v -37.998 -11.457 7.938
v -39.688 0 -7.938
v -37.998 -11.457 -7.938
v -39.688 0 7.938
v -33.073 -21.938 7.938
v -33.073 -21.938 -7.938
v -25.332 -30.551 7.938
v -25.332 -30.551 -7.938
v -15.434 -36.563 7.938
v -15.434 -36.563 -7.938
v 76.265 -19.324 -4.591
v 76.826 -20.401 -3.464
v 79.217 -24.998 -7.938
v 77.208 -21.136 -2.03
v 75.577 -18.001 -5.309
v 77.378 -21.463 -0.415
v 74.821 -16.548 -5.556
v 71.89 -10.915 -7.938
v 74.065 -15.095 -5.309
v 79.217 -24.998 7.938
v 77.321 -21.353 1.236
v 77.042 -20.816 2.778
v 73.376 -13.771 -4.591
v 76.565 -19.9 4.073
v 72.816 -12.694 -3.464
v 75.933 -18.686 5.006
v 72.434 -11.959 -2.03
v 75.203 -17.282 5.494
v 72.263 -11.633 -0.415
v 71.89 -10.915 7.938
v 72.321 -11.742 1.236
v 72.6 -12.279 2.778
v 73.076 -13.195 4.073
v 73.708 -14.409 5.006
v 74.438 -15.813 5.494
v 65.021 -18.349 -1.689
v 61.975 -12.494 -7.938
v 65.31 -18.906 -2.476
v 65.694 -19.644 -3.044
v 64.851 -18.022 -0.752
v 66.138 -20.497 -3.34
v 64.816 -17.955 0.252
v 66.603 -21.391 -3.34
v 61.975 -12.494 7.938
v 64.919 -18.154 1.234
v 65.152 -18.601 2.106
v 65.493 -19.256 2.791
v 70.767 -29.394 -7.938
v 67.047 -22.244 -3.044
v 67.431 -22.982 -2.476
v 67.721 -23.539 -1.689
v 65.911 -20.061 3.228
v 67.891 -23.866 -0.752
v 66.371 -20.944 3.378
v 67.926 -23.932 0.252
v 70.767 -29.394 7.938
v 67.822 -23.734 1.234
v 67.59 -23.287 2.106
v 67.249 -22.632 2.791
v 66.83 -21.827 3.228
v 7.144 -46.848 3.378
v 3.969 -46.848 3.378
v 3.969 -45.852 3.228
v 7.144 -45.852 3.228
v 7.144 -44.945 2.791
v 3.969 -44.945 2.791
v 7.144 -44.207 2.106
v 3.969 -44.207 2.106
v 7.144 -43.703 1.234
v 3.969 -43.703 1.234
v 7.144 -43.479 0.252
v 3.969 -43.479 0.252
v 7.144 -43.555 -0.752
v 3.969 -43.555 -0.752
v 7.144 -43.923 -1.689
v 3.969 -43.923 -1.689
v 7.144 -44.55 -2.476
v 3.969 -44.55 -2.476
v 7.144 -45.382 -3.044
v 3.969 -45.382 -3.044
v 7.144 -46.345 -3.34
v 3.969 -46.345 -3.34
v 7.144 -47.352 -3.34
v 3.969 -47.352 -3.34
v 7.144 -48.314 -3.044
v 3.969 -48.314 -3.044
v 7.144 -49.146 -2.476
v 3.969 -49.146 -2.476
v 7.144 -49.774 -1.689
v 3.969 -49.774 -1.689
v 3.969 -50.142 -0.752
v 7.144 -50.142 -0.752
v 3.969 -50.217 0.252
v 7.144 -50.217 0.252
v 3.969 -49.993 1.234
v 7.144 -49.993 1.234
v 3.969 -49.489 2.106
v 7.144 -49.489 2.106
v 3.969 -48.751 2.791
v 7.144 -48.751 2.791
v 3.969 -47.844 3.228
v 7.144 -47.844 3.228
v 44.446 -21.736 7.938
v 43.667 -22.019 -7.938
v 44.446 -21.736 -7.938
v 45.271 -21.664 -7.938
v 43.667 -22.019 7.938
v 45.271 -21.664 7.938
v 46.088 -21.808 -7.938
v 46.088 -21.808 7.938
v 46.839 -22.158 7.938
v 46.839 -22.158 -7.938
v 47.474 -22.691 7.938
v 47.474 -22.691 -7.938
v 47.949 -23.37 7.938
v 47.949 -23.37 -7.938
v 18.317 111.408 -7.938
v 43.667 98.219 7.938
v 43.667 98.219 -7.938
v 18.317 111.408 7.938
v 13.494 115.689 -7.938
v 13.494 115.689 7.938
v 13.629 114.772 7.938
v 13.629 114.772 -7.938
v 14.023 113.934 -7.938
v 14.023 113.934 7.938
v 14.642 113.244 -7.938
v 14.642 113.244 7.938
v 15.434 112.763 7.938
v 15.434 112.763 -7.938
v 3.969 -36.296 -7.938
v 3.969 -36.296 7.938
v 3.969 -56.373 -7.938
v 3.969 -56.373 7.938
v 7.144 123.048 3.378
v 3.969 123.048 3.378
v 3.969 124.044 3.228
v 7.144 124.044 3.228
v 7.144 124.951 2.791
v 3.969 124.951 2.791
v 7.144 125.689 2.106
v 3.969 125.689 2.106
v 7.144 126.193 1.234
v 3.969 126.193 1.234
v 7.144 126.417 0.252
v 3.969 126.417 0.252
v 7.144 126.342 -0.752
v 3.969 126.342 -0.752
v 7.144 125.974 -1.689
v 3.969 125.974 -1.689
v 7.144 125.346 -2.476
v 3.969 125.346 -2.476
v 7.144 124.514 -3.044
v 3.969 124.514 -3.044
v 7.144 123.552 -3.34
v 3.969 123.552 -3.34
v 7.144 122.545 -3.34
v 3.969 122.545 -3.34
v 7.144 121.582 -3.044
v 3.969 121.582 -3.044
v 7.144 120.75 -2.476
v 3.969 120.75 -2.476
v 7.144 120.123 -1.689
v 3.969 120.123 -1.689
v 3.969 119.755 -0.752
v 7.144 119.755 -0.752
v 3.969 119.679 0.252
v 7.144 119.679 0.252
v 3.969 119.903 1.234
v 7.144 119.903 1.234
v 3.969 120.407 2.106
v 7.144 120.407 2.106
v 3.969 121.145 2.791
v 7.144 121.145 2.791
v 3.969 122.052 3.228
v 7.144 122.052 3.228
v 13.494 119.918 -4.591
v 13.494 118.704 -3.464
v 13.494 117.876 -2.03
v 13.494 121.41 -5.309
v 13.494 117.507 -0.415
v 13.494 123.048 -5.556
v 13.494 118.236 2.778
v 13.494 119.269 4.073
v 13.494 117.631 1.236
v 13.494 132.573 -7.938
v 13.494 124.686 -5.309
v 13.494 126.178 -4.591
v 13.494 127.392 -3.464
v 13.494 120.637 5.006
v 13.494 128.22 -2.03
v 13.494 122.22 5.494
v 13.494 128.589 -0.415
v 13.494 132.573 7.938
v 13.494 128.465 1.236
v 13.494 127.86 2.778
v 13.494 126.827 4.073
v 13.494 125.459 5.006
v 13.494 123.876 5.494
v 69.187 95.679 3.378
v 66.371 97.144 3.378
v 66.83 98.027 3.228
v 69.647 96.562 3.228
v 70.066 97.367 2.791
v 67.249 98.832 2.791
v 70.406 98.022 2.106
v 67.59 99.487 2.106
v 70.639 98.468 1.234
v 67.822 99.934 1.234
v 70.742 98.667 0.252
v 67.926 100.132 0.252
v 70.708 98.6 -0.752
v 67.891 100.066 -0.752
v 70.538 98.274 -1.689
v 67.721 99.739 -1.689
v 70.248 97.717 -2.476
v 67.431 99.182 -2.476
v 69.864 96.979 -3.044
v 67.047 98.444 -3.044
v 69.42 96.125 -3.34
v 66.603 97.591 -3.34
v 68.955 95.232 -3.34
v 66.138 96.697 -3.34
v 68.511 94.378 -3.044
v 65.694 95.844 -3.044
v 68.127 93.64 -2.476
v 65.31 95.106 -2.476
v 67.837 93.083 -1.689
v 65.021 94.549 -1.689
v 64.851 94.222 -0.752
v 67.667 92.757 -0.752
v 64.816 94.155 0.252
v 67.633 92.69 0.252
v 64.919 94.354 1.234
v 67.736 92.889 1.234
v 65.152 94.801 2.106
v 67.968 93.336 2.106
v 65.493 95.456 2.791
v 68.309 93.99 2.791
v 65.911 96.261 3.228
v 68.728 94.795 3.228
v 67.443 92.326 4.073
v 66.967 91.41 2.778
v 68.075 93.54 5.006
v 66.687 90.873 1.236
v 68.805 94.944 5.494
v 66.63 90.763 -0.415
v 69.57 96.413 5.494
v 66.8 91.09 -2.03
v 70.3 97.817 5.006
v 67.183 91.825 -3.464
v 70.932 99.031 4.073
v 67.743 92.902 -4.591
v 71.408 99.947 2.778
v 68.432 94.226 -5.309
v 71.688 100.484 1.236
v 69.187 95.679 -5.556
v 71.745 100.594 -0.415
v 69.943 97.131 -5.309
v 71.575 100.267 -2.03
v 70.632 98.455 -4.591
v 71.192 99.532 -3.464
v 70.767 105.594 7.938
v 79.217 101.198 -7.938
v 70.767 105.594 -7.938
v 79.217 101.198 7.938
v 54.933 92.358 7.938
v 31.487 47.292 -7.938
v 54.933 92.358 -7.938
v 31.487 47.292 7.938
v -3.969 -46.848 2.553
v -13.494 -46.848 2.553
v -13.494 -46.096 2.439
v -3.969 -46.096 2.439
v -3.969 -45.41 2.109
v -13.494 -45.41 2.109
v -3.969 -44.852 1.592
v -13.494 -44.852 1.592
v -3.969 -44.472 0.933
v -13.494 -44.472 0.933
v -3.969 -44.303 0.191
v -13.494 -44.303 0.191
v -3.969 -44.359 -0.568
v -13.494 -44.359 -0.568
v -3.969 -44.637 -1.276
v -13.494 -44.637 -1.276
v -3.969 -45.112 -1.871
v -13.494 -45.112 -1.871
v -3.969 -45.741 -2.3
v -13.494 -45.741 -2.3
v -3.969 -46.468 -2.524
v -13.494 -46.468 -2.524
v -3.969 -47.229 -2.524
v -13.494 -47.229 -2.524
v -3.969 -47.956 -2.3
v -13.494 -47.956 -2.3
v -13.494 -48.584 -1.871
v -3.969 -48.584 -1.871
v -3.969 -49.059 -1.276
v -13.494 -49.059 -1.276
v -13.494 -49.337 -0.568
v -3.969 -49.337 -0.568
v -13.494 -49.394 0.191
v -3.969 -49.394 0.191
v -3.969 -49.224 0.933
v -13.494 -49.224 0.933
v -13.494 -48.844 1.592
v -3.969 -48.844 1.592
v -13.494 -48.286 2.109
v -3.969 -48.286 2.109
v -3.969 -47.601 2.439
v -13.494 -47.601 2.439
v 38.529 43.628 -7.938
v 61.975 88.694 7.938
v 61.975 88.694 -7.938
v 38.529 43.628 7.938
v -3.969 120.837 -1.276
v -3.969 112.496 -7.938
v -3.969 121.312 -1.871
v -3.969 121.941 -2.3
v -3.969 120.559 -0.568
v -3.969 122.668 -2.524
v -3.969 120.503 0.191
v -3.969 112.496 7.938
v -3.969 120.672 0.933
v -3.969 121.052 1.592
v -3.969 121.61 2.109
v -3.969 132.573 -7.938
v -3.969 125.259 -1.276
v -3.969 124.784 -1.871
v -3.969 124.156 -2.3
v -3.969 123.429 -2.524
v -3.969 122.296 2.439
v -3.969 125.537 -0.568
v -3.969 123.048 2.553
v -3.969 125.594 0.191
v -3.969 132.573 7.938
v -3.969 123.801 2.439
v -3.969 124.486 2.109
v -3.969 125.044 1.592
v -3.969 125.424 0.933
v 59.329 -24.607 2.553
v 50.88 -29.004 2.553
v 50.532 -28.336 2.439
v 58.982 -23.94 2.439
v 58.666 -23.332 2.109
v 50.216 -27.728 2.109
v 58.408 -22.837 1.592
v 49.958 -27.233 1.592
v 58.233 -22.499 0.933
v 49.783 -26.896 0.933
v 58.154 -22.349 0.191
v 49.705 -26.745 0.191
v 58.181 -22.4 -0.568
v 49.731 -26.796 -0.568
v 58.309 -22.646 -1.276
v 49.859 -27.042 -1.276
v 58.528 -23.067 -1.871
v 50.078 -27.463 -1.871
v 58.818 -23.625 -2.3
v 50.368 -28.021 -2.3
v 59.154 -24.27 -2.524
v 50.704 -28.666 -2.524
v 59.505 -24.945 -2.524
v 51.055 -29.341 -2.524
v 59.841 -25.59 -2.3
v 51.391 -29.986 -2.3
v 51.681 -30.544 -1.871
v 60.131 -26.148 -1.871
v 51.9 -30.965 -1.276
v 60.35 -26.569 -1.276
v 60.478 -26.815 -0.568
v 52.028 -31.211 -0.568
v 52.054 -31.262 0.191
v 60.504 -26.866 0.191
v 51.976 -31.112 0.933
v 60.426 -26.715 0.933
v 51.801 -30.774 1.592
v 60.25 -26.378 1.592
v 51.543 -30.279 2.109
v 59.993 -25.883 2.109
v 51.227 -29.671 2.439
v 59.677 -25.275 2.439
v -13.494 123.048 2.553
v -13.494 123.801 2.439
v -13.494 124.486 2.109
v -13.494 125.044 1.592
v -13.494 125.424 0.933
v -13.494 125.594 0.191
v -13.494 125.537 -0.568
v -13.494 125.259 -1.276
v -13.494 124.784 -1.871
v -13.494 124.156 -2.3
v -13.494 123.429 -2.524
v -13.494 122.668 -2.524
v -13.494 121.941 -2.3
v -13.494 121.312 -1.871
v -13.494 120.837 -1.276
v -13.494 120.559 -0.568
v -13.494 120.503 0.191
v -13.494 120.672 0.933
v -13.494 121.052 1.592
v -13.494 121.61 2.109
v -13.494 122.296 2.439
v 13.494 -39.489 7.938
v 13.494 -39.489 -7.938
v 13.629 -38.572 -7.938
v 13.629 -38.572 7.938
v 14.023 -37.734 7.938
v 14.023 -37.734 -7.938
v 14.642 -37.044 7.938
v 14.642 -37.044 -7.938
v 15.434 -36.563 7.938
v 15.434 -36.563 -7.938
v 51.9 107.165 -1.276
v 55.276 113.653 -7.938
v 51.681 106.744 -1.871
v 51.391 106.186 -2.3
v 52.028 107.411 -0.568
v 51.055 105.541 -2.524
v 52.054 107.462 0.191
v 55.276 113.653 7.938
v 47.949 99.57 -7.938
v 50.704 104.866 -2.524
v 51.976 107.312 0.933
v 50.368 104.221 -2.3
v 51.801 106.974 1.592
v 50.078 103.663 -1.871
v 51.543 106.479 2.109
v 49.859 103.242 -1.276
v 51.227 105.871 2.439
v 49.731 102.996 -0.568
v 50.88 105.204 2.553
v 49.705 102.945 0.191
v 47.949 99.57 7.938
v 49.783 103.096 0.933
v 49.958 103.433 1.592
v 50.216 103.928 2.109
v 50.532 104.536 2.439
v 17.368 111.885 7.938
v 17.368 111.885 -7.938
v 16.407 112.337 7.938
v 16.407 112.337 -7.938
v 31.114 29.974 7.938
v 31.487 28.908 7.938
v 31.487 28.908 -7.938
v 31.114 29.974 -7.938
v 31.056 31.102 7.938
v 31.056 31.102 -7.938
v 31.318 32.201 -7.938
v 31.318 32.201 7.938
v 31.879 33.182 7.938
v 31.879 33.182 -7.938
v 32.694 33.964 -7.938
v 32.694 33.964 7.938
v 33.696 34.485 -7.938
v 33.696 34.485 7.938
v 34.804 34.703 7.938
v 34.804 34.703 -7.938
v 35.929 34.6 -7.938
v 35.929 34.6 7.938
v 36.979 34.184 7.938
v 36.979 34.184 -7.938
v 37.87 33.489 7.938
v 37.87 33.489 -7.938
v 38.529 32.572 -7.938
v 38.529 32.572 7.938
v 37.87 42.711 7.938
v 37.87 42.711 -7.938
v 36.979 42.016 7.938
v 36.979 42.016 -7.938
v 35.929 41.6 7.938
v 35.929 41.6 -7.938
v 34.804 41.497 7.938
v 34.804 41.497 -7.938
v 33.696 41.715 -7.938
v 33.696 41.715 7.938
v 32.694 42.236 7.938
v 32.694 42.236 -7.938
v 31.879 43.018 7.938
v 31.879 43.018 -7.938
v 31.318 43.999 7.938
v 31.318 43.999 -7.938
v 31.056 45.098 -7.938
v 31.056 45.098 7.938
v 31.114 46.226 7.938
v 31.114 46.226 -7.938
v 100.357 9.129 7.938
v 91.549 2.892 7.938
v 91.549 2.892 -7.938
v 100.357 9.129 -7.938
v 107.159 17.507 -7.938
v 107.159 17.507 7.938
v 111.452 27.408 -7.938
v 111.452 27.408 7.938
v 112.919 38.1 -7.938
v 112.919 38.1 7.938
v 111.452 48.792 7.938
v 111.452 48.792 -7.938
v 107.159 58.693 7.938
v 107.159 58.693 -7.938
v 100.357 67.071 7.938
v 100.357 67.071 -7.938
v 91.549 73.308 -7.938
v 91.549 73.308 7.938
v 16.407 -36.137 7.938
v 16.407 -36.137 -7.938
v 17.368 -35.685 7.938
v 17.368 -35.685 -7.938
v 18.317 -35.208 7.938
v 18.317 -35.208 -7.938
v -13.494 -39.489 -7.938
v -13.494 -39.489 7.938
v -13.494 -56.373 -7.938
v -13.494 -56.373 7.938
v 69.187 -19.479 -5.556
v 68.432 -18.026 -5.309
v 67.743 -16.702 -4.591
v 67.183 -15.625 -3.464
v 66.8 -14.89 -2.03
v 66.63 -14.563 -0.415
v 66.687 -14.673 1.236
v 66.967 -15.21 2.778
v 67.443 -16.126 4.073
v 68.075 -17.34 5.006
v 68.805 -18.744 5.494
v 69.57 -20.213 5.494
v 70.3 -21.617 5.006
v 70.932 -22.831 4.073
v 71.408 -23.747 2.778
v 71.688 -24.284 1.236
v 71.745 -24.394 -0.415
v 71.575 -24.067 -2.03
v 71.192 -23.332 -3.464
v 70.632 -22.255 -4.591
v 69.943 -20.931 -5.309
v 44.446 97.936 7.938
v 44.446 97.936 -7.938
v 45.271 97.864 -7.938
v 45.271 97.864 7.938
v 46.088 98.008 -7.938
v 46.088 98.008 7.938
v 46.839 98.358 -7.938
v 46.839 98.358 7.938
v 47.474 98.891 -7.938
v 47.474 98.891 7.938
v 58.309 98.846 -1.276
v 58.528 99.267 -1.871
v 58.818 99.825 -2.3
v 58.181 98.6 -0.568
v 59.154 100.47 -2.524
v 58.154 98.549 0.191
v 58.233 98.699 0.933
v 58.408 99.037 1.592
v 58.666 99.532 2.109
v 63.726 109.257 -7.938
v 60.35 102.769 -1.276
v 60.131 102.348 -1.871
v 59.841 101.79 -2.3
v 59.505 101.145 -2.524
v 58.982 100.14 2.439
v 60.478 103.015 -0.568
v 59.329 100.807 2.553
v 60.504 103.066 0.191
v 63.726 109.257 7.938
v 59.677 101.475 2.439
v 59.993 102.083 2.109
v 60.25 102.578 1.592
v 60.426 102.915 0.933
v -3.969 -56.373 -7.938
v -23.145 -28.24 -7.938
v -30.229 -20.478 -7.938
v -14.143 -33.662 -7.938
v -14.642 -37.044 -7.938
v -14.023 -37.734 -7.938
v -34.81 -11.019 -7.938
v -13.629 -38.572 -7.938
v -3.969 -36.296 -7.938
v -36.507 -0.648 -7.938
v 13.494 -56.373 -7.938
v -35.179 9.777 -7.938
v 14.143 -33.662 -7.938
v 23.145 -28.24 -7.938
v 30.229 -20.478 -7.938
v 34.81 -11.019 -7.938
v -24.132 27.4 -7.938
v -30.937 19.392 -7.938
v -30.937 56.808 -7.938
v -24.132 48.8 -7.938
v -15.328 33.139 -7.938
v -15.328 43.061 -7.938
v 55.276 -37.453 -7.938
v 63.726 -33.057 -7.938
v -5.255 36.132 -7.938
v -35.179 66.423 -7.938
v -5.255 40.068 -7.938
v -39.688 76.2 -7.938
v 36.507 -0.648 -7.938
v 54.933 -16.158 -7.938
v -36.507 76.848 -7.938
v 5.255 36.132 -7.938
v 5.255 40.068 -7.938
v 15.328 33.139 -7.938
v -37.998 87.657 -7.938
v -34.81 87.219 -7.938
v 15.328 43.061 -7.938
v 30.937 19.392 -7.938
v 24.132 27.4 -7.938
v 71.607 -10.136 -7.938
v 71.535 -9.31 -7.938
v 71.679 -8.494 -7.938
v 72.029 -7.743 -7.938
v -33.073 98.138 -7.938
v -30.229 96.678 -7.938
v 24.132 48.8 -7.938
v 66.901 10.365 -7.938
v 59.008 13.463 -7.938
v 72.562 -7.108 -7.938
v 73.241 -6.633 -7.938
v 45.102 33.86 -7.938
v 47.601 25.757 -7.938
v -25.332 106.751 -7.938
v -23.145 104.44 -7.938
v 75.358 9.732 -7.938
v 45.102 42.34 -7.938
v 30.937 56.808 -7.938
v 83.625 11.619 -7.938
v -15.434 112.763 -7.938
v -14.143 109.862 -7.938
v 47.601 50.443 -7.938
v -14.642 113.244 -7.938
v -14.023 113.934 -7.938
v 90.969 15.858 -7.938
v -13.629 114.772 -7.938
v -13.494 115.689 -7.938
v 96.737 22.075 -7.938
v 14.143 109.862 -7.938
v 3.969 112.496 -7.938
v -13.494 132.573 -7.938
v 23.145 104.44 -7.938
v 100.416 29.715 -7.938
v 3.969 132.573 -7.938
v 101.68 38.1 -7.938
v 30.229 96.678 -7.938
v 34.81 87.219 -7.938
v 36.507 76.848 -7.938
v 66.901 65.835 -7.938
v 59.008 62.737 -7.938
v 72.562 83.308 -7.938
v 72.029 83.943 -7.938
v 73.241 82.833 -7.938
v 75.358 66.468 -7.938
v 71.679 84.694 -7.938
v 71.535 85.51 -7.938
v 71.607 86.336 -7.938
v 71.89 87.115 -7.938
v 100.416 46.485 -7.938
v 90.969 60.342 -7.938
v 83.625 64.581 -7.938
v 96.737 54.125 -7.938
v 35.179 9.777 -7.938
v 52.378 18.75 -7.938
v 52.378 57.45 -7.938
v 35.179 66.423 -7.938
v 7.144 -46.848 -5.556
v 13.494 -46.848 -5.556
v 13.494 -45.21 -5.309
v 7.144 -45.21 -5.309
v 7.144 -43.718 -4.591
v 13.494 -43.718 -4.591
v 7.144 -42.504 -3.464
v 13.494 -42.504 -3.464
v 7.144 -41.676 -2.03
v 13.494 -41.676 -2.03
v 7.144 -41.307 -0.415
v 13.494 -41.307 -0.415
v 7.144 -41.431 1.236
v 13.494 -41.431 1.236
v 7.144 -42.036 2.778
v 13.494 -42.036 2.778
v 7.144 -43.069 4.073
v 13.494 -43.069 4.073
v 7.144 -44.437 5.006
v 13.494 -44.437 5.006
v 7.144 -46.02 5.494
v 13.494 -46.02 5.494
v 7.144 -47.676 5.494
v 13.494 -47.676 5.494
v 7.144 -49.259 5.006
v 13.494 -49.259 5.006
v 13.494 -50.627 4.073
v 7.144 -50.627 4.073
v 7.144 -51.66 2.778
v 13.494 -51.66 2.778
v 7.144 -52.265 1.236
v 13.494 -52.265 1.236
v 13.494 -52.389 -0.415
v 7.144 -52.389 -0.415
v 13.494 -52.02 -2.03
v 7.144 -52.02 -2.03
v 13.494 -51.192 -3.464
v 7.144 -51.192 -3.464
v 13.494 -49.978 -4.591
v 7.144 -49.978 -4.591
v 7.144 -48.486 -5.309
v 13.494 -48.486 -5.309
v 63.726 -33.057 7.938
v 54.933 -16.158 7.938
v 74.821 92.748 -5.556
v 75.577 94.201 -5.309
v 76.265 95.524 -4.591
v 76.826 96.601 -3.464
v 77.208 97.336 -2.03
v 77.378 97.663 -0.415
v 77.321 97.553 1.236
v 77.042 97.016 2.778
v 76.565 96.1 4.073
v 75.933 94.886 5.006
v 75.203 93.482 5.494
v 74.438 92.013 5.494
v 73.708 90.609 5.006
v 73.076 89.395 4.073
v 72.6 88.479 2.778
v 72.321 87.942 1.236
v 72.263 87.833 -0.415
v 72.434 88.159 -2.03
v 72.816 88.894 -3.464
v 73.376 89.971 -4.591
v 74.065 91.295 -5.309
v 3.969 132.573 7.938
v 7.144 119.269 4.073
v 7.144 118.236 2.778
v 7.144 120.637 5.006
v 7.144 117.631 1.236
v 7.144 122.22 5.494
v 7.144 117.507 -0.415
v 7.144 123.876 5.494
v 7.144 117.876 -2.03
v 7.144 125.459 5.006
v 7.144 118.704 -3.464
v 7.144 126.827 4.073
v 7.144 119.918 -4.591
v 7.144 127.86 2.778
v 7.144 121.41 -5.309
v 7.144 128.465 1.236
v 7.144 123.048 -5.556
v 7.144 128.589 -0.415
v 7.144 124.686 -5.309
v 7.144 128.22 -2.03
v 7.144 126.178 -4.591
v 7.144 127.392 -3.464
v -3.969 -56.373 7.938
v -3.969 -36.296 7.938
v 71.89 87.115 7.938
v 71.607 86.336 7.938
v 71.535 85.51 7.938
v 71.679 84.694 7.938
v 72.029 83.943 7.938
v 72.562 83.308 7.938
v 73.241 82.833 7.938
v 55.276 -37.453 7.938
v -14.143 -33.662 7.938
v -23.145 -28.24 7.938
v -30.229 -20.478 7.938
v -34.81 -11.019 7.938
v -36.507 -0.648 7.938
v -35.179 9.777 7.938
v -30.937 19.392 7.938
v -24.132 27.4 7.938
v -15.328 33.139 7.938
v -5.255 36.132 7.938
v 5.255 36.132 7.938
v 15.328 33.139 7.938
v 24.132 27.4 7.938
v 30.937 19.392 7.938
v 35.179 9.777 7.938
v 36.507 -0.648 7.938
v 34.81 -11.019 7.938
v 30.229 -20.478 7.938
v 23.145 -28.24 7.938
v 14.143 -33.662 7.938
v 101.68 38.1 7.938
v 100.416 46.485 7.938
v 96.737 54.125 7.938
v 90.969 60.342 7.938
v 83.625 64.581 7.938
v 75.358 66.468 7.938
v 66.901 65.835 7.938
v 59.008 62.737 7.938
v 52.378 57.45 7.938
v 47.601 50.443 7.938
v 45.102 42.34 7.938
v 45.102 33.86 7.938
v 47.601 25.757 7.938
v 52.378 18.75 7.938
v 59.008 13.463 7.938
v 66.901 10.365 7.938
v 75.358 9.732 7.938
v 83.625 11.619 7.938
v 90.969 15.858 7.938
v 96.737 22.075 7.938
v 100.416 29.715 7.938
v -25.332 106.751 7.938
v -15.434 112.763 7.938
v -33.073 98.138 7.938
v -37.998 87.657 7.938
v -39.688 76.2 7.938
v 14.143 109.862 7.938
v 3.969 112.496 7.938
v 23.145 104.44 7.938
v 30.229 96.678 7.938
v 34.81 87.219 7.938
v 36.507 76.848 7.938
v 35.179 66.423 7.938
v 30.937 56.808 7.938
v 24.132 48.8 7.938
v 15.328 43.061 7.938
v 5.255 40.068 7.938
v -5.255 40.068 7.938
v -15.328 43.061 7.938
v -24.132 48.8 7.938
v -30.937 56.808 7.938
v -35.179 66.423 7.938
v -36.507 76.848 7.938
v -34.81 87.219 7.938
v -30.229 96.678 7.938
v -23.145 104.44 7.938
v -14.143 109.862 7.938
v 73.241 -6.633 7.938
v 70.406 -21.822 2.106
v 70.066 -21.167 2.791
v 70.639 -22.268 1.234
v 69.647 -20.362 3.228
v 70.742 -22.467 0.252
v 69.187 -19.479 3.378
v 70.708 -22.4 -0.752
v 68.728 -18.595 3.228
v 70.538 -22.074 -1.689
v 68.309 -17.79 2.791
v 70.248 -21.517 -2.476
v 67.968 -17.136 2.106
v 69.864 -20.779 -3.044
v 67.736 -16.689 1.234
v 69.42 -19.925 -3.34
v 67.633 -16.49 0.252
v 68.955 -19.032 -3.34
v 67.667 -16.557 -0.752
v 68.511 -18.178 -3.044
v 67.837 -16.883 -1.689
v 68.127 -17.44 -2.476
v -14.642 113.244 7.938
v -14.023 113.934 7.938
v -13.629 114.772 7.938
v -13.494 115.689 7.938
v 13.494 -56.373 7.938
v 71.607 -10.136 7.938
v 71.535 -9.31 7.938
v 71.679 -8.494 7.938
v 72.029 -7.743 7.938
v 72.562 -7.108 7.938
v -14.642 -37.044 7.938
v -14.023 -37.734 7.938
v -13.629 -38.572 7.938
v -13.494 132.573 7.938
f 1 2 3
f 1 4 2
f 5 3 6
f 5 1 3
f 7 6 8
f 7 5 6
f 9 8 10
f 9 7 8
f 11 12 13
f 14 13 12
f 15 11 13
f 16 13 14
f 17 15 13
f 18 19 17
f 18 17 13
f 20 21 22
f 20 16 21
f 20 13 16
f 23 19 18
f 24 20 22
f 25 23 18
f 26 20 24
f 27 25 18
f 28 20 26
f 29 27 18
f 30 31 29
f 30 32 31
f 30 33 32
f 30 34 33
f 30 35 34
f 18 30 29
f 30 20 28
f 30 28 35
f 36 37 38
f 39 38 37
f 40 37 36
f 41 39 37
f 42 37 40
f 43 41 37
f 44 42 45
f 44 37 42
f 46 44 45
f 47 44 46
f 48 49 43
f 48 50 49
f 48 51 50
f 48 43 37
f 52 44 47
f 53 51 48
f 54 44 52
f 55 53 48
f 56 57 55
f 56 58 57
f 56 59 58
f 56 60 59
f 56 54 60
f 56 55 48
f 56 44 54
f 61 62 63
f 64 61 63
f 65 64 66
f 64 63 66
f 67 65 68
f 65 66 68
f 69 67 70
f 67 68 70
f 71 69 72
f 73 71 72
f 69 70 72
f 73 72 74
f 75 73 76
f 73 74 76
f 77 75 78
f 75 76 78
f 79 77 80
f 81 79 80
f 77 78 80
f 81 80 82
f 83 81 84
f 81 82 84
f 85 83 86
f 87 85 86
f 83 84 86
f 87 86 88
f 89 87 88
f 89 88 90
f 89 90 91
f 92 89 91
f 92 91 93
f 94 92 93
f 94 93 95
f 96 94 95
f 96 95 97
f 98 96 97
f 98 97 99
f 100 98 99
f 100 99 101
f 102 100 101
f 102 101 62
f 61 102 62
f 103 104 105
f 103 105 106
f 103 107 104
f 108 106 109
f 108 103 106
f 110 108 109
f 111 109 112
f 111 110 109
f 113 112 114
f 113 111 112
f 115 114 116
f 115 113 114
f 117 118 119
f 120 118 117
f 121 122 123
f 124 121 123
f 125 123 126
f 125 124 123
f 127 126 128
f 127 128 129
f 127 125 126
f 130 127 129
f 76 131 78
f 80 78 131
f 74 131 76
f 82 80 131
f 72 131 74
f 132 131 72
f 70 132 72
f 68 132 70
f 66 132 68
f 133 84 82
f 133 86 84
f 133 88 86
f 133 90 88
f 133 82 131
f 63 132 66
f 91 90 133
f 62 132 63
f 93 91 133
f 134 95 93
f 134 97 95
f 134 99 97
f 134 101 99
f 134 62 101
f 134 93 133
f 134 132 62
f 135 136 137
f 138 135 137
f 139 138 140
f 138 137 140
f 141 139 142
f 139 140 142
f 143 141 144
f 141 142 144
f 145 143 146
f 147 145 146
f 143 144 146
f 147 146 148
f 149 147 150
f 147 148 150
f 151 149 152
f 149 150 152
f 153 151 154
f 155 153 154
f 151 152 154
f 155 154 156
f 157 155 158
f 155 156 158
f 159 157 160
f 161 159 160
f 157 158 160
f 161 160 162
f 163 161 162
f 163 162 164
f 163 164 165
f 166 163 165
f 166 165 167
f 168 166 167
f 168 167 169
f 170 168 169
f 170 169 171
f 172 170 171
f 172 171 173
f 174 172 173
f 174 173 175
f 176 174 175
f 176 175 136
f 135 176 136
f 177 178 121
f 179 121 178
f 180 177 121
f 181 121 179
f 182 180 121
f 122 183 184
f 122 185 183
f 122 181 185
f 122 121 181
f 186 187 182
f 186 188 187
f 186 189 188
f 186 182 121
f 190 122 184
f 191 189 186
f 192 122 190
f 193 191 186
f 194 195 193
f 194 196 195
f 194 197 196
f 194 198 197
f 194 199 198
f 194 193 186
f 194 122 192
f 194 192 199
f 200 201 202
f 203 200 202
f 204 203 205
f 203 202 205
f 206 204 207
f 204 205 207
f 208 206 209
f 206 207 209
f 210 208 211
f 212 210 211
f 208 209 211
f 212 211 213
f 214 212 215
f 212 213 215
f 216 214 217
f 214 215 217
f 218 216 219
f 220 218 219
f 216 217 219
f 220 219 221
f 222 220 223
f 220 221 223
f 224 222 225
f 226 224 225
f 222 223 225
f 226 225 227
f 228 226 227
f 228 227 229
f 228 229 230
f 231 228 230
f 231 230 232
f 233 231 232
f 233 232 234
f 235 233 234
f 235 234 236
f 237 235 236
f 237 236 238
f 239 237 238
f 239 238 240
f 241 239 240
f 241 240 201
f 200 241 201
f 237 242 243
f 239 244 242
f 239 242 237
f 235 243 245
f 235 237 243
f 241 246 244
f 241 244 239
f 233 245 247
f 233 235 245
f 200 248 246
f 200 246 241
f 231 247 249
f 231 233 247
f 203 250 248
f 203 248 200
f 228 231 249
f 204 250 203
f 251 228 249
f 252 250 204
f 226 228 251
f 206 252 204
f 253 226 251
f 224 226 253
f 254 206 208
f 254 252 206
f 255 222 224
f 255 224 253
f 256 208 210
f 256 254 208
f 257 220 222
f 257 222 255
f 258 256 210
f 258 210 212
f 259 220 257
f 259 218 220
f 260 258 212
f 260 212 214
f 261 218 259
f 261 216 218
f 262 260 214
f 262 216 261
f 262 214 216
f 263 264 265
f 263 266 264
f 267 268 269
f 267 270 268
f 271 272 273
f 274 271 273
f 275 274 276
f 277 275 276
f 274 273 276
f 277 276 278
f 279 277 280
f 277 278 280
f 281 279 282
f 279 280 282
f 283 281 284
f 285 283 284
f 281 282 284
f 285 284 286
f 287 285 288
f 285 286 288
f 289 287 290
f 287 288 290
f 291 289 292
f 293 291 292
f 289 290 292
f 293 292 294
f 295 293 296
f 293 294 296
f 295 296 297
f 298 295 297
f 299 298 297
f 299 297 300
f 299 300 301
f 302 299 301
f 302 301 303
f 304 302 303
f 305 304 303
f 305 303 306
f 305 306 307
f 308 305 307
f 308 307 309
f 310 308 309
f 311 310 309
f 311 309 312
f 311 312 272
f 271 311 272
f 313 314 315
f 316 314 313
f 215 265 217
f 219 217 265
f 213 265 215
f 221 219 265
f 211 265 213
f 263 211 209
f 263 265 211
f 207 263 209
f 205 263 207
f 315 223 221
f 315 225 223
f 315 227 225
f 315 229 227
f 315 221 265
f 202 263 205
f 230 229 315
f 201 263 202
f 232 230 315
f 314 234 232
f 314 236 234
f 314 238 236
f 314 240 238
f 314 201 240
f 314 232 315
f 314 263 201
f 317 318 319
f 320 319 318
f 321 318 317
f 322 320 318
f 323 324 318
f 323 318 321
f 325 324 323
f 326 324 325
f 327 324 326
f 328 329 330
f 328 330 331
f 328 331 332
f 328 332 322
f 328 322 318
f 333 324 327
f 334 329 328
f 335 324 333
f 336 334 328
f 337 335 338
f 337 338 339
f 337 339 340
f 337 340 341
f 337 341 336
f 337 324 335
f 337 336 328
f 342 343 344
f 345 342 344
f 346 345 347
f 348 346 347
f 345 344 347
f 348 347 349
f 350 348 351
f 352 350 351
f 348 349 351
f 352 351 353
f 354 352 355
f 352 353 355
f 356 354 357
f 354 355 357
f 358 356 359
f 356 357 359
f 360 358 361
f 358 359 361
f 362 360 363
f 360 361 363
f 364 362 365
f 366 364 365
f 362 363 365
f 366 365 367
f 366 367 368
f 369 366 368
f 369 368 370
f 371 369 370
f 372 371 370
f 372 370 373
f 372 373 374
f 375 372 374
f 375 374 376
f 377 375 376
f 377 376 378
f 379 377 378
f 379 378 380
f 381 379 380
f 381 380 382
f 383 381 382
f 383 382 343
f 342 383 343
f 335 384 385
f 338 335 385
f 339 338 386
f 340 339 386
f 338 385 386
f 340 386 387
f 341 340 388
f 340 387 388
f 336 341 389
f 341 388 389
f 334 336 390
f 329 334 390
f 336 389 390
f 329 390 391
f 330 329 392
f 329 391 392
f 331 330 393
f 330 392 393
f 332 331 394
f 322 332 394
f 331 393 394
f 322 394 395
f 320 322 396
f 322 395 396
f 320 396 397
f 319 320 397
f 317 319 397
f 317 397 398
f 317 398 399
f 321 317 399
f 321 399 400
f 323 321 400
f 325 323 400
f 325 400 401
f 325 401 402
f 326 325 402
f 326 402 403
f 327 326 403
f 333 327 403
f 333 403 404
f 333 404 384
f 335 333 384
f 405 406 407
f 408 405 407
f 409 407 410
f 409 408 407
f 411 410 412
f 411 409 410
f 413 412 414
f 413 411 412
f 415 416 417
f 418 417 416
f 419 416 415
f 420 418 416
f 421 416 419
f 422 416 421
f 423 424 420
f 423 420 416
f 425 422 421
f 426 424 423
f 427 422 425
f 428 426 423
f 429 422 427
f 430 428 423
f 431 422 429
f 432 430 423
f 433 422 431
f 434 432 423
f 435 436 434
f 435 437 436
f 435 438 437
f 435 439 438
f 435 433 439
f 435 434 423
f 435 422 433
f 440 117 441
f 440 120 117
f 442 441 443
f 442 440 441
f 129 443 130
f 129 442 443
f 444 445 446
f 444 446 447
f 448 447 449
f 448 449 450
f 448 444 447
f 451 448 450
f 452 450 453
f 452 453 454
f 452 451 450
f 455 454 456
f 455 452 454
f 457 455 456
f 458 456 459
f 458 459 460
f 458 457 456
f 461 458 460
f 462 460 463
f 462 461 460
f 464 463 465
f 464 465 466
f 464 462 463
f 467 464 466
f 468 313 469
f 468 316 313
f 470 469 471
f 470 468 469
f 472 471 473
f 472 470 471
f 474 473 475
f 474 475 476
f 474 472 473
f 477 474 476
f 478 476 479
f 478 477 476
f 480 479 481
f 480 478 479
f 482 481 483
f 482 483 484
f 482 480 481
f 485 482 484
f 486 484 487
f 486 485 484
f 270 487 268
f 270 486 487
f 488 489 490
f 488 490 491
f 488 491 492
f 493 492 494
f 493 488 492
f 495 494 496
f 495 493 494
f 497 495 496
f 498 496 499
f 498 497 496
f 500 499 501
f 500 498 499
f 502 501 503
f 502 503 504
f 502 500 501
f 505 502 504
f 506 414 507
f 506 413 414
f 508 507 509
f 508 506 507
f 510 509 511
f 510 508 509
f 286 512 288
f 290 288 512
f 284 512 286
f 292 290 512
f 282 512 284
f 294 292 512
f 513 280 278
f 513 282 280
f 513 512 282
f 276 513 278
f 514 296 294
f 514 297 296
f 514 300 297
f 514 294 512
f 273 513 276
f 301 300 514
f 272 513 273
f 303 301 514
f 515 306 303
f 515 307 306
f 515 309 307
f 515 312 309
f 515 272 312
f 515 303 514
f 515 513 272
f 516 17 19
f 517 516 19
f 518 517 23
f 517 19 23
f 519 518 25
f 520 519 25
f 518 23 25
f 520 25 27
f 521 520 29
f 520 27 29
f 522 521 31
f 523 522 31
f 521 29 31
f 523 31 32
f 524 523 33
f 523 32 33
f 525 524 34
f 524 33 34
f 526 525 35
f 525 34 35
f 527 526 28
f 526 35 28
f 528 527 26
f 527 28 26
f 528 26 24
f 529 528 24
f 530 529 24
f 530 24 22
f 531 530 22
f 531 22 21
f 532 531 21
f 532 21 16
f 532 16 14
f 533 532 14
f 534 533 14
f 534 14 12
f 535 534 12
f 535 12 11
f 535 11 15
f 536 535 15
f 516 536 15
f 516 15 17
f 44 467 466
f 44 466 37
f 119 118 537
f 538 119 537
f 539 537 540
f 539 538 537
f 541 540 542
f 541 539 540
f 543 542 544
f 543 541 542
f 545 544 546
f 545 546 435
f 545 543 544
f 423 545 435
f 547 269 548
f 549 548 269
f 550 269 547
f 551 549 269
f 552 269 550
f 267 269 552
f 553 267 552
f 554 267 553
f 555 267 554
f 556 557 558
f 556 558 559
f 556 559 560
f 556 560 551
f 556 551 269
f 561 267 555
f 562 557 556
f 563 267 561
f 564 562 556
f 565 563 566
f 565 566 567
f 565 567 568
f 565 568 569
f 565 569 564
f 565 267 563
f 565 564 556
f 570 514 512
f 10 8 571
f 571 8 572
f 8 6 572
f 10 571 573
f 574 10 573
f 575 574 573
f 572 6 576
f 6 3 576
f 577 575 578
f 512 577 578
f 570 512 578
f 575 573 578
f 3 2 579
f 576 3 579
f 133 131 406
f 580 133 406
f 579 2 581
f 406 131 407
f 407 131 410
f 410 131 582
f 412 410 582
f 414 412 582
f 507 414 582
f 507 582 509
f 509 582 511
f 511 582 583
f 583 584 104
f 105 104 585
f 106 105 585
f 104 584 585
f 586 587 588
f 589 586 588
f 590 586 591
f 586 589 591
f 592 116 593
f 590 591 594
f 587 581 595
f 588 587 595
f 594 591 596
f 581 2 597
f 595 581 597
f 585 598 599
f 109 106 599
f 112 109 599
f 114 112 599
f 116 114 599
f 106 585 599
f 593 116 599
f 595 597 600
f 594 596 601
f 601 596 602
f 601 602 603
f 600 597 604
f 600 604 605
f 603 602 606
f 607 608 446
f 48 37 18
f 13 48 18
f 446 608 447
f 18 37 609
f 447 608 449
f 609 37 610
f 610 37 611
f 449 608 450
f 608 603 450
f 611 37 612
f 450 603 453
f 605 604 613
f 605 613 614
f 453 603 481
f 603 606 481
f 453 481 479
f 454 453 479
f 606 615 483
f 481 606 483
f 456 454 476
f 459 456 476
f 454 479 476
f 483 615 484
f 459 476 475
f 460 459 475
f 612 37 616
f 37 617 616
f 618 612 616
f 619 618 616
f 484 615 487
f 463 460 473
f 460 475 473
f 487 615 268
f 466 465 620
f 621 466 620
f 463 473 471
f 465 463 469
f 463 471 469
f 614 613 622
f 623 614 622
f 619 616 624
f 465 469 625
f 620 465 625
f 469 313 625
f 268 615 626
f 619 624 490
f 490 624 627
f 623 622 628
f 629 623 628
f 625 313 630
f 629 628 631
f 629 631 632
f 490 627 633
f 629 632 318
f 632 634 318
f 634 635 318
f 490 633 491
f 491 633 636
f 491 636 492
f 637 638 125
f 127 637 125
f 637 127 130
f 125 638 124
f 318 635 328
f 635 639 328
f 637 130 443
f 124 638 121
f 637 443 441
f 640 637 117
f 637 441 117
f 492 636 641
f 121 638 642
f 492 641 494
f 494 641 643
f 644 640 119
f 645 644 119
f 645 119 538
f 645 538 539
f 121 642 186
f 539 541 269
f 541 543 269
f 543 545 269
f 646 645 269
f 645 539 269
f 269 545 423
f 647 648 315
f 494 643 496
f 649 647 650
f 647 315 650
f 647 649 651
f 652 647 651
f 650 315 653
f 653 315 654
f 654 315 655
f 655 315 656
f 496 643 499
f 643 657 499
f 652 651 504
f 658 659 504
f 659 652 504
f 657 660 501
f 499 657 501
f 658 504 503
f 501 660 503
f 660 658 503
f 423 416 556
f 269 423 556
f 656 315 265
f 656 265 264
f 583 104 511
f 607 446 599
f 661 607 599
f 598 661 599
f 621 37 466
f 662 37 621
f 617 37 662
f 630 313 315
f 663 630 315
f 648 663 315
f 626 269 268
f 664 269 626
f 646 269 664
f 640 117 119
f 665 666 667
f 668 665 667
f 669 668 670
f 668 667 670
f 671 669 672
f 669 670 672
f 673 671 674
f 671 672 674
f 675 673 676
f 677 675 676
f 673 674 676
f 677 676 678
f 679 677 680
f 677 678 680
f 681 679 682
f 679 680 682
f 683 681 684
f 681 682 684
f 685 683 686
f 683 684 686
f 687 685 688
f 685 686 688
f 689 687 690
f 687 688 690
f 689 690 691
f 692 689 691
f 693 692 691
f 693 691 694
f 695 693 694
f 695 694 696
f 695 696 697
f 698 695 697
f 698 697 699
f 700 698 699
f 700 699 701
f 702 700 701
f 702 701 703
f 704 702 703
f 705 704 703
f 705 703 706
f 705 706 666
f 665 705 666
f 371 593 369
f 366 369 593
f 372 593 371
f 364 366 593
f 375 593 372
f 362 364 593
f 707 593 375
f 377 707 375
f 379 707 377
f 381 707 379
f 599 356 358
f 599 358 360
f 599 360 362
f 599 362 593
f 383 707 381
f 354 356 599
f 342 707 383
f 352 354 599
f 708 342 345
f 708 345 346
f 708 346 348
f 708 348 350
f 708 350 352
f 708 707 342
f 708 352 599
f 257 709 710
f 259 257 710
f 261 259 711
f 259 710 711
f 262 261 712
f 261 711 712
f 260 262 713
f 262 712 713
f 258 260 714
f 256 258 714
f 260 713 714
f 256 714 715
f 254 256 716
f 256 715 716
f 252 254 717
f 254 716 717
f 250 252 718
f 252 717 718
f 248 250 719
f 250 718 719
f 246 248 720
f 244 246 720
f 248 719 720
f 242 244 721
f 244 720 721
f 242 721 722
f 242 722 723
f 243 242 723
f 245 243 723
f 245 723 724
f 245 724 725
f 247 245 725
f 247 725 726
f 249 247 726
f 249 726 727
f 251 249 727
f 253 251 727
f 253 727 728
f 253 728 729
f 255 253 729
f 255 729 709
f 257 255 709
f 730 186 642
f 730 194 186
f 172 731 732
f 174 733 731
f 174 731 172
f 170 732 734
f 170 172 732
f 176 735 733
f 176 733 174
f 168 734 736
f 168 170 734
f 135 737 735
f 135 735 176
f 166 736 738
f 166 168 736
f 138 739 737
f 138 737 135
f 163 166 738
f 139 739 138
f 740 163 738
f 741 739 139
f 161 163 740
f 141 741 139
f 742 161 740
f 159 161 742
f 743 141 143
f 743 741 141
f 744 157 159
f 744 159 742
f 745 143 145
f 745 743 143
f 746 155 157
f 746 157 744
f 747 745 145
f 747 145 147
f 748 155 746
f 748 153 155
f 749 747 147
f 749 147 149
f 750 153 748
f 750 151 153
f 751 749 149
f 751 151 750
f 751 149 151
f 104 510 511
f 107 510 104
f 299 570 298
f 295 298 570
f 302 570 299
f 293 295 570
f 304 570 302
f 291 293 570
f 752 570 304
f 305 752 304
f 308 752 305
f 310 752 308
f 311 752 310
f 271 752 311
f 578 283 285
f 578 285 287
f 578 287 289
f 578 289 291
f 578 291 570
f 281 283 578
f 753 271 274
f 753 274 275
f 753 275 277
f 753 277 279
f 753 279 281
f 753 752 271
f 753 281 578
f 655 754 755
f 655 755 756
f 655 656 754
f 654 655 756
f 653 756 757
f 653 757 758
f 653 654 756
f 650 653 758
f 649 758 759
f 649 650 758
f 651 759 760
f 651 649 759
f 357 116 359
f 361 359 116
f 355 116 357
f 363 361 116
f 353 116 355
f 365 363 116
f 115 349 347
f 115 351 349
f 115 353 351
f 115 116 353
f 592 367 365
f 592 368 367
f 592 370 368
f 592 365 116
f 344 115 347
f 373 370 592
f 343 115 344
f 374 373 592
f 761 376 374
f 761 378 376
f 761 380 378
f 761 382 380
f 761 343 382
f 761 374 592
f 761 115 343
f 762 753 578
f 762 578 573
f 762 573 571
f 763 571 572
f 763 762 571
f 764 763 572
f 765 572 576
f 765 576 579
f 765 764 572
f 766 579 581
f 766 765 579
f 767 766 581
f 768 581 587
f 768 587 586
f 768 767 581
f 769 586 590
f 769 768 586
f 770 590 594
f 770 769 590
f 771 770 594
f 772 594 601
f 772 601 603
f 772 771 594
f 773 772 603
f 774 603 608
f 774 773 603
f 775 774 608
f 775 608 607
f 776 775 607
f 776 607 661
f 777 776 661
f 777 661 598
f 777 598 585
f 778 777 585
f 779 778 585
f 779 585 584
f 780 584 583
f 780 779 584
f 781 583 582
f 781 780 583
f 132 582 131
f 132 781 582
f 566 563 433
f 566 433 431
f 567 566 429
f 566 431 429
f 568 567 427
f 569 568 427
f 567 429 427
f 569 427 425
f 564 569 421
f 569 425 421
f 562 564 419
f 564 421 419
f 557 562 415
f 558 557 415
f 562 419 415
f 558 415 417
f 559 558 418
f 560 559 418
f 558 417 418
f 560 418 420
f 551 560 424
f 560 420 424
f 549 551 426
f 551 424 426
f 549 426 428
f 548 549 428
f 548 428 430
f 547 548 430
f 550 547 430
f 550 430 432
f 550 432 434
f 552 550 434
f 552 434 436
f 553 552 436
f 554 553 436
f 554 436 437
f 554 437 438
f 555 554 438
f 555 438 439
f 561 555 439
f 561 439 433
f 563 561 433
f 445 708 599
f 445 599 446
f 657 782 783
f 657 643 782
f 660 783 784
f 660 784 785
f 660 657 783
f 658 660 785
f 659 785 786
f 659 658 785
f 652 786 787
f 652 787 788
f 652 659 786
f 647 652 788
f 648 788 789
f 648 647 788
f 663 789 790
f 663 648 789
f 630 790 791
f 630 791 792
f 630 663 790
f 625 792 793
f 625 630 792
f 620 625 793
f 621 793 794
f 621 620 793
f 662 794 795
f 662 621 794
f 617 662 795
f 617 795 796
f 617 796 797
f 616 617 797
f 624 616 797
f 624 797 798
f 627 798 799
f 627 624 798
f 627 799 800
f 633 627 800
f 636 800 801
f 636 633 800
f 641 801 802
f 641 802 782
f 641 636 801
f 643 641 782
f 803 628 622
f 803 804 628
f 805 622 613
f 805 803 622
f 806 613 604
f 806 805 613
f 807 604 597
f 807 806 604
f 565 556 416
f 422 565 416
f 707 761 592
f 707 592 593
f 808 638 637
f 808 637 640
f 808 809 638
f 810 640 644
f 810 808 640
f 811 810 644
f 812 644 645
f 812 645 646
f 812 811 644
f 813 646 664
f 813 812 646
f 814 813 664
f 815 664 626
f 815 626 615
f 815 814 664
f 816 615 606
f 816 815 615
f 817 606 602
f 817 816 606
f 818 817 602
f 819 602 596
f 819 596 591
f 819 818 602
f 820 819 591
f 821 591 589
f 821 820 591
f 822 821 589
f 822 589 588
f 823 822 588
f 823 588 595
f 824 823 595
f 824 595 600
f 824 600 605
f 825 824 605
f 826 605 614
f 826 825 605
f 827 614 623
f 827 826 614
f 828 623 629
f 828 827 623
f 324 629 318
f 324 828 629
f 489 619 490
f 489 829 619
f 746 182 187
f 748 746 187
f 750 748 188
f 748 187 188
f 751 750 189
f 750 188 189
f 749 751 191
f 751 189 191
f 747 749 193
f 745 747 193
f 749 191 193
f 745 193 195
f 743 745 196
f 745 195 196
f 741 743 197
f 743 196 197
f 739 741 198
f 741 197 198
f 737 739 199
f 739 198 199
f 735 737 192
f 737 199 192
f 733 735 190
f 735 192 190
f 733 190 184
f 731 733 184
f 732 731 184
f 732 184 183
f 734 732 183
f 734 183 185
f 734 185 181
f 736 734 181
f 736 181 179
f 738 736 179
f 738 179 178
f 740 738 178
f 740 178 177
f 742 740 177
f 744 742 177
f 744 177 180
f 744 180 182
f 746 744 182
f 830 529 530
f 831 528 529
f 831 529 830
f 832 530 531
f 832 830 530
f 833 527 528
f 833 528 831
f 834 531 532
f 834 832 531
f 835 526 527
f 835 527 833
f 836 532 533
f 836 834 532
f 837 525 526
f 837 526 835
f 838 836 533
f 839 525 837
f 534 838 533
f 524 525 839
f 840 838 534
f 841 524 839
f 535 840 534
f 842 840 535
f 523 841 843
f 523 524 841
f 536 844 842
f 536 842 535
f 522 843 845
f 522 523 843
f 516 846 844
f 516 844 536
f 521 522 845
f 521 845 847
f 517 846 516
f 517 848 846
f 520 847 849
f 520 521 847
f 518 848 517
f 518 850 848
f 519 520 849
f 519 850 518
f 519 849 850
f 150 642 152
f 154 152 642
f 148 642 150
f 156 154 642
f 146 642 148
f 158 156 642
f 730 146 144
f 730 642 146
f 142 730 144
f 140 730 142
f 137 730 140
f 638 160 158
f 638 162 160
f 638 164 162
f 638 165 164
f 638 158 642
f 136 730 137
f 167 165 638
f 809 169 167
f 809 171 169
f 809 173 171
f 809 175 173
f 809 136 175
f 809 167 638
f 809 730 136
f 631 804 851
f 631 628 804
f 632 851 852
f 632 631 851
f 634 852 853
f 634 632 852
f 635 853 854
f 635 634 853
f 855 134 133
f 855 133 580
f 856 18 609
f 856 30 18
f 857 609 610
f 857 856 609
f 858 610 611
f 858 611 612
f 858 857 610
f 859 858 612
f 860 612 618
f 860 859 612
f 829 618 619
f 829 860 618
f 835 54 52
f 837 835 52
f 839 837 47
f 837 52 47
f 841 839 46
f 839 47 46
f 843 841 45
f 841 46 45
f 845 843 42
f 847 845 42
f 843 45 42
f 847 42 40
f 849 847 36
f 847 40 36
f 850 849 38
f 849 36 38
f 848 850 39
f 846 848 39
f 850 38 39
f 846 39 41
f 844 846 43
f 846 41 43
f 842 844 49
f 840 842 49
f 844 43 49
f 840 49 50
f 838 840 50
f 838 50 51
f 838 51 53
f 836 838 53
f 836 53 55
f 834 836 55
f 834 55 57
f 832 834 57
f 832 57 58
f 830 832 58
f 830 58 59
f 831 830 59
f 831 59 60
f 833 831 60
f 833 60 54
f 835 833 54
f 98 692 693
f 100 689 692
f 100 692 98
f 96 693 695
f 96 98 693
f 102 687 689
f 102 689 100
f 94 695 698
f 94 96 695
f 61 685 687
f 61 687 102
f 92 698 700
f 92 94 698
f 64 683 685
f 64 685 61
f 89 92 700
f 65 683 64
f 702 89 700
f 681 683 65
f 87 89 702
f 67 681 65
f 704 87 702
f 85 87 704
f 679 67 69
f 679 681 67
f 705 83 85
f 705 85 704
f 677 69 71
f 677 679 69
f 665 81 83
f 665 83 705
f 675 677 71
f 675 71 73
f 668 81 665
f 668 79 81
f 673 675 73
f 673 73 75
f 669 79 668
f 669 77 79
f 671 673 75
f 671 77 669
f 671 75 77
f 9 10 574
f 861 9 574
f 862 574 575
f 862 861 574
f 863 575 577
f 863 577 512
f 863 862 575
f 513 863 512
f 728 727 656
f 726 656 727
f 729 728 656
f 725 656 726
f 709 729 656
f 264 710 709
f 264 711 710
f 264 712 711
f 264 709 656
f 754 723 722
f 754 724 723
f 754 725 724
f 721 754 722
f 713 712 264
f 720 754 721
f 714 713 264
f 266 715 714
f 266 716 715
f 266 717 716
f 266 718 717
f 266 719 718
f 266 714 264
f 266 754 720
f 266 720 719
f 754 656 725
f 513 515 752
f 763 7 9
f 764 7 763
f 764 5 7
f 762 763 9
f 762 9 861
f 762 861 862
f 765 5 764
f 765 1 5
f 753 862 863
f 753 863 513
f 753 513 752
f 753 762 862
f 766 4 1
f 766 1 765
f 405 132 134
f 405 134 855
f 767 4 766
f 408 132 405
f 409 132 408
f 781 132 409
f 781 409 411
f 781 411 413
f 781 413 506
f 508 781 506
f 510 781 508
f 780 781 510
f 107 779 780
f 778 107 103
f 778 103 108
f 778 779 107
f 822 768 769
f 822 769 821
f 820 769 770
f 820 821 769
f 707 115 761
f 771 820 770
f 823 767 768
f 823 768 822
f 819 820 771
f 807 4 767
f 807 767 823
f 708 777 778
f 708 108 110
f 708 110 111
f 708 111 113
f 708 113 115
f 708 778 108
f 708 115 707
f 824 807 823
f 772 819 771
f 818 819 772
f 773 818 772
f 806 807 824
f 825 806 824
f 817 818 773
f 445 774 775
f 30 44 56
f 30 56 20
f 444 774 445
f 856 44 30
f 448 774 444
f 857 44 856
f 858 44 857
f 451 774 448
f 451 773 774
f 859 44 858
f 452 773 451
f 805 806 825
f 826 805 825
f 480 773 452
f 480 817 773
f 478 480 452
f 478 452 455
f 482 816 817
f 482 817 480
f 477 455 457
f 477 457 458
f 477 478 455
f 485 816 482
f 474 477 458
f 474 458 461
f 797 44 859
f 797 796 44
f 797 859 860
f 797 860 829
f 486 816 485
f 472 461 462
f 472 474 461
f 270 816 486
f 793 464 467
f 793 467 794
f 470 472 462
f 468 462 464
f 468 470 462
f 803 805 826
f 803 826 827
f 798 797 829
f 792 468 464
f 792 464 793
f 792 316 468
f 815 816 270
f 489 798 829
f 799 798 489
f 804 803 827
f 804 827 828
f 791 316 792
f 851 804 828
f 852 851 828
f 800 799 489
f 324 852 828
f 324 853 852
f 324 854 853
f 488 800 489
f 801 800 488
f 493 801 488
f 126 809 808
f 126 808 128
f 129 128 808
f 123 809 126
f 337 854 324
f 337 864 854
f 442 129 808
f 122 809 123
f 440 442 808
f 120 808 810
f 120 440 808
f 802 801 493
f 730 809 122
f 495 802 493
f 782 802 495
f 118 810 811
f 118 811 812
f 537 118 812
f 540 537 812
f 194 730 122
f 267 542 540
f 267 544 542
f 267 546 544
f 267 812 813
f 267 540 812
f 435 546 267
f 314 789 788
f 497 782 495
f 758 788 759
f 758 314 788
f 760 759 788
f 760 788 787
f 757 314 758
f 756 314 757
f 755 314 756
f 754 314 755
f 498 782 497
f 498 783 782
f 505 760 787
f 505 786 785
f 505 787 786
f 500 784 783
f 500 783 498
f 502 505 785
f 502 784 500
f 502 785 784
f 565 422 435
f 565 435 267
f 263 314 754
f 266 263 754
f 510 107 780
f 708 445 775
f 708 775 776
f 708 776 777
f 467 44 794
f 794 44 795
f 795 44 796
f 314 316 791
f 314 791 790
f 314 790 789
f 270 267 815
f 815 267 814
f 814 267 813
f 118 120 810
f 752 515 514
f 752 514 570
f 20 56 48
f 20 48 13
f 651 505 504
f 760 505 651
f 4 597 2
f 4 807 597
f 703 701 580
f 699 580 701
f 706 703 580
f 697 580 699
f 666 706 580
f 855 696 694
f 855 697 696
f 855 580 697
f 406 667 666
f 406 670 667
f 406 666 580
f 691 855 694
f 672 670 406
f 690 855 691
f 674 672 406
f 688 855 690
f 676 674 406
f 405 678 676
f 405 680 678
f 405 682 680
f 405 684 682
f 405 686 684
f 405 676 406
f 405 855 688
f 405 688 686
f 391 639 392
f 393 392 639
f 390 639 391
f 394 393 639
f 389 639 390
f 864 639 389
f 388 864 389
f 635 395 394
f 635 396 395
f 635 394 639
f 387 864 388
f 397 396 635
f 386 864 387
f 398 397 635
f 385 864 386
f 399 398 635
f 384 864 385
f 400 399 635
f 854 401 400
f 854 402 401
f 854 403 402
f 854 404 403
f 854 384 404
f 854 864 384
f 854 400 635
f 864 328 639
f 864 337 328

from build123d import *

# Parameters (mm, degrees)
SKETCH1_R                                        = 28.448
EXTRUDE1_DEPTH                                   = 7.9375
CBORE_FOR_1_4_SOCKET_HEAD_CAP_SCREW1_D           = 6.7564
CBORE_FOR_1_4_SOCKET_HEAD_CAP_SCREW1_DEPTH       = 9.525
CBORE_FOR_1_4_SOCKET_HEAD_CAP_SCREW1_CBORE_D     = 11.1125
CBORE_FOR_1_4_SOCKET_HEAD_CAP_SCREW1_CBORE_DEPTH = 6.35
F_1_4_20_TAPPED_HOLE1_D                          = 5.1054
CBORE_FOR_1_4_SOCKET_HEAD_CAP_SCREW3_D           = 6.7564
CBORE_FOR_1_4_SOCKET_HEAD_CAP_SCREW3_DEPTH       = 9.525
CBORE_FOR_1_4_SOCKET_HEAD_CAP_SCREW3_CBORE_D     = 11.1125
CBORE_FOR_1_4_SOCKET_HEAD_CAP_SCREW3_CBORE_DEPTH = 6.35
F_1_4_20_TAPPED_HOLE4_D                          = 5.1054
CBORE_FOR_1_4_SOCKET_HEAD_CAP_SCREW4_D           = 6.7564
CBORE_FOR_1_4_SOCKET_HEAD_CAP_SCREW4_DEPTH       = 9.525
CBORE_FOR_1_4_SOCKET_HEAD_CAP_SCREW4_CBORE_D     = 11.1125
CBORE_FOR_1_4_SOCKET_HEAD_CAP_SCREW4_CBORE_DEPTH = 6.35
F_1_4_20_TAPPED_HOLE5_D                          = 5.1054
F_1_4_20_TAPPED_HOLE5_DEPTH                      = 9.525
CBORE_FOR_1_4_SOCKET_HEAD_CAP_SCREW5_D           = 6.7564
CBORE_FOR_1_4_SOCKET_HEAD_CAP_SCREW5_DEPTH       = 9.525
CBORE_FOR_1_4_SOCKET_HEAD_CAP_SCREW5_CBORE_D     = 11.1125
CBORE_FOR_1_4_SOCKET_HEAD_CAP_SCREW5_CBORE_DEPTH = 6.35
F_1_4_20_TAPPED_HOLE6_D                          = 5.1054
F_1_4_20_TAPPED_HOLE6_DEPTH                      = 9.525
FILLET1_R                                        = 3.175


with BuildPart() as part:
    # Sketch1 → Extrude1 (new, symmetric)
    with BuildSketch(Plane.XY):
        with BuildLine():
            Line((-39.6875, 76.2), (-39.6875, 0))
            ThreePointArc((-39.6875, 0), (-32.485618813, -22.798733003), (-13.49375, -37.323134477))
            Line((-13.49375, -37.323134477), (-13.49375, -56.373134477))
            Line((-13.49375, -56.373134477), (-3.96875, -56.373134477))
            Line((-3.96875, -56.373134477), (-3.96875, -36.296166184))
            ThreePointArc((-3.96875, -36.296166184), (0, 36.5125), (3.96875, -36.296166184))
            Line((3.96875, -36.296166184), (3.96875, -56.373134477))
            Line((3.96875, -56.373134477), (13.49375, -56.373134477))
            Line((13.49375, -56.373134477), (13.49375, -37.323134477))
            ThreePointArc((13.49375, -37.323134477), (15.940663019, -36.345466275), (18.317307692, -35.207582921))
            Line((18.317307692, -35.207582921), (46.483374029, -20.553736767))
            Line((46.483374029, -20.553736767), (55.275681722, -37.45337657))
            Line((55.275681722, -37.45337657), (63.725501623, -33.057222723))
            Line((63.725501623, -33.057222723), (54.93319393, -16.157582921))
            Line((54.93319393, -16.157582921), (31.487040084, 28.908123218))
            ThreePointArc((31.487040084, 28.908123218), (33.176067607, 34.260612279), (38.528556668, 32.571584756))
            Line((38.528556668, 32.571584756), (61.974710515, -12.494121383))
            Line((61.974710515, -12.494121383), (70.767018207, -29.393761185))
            Line((70.767018207, -29.393761185), (79.216838108, -24.997607339))
            Line((79.216838108, -24.997607339), (70.424530416, -8.097967537))
            Line((70.424530416, -8.097967537), (91.549080168, 2.892417079))
            ThreePointArc((91.549080168, 2.892417079), (112.919272476, 38.1), (91.549080168, 73.307582921))
            Line((91.549080168, 73.307582921), (70.424530416, 84.297967537))
            Line((70.424530416, 84.297967537), (79.216838108, 101.197607339))
            Line((79.216838108, 101.197607339), (70.767018207, 105.593761185))
            Line((70.767018207, 105.593761185), (61.974710515, 88.694121383))
            Line((61.974710515, 88.694121383), (38.528556668, 43.628415244))
            ThreePointArc((38.528556668, 43.628415244), (33.176067607, 41.939387721), (31.487040084, 47.291876782))
            Line((31.487040084, 47.291876782), (54.93319393, 92.357582921))
            Line((54.93319393, 92.357582921), (63.725501623, 109.257222723))
            Line((63.725501623, 109.257222723), (55.275681722, 113.65337657))
            Line((55.275681722, 113.65337657), (46.483374029, 96.753736767))
            Line((46.483374029, 96.753736767), (18.317307692, 111.407582921))
            ThreePointArc((18.317307692, 111.407582921), (15.940663019, 112.545466275), (13.49375, 113.523134477))
            Line((13.49375, 113.523134477), (13.49375, 132.573134477))
            Line((13.49375, 132.573134477), (3.96875, 132.573134477))
            Line((3.96875, 132.573134477), (3.96875, 112.496166184))
            ThreePointArc((3.96875, 112.496166184), (0, 39.6875), (-3.96875, 112.496166184))
            Line((-3.96875, 112.496166184), (-3.96875, 132.573134477))
            Line((-3.96875, 132.573134477), (-13.49375, 132.573134477))
            Line((-13.49375, 132.573134477), (-13.49375, 113.523134477))
            ThreePointArc((-13.49375, 113.523134477), (-32.485618813, 98.998733003), (-39.6875, 76.2))
        make_face()
        with Locations((73.231772476, 38.1)):
            Circle(SKETCH1_R, mode=Mode.SUBTRACT)
    extrude(amount=EXTRUDE1_DEPTH, both=True)

    # CBORE for 1/4 Socket Head Cap Screw1
    with Locations(Plane(origin=(13.49375, 0, 0), x_dir=(0, 0, -1), z_dir=(1, 0, 0))):
        with Locations((0, 123.048134477)):
            CounterBoreHole(CBORE_FOR_1_4_SOCKET_HEAD_CAP_SCREW1_D / 2, CBORE_FOR_1_4_SOCKET_HEAD_CAP_SCREW1_CBORE_D / 2, CBORE_FOR_1_4_SOCKET_HEAD_CAP_SCREW1_CBORE_DEPTH, depth=CBORE_FOR_1_4_SOCKET_HEAD_CAP_SCREW1_DEPTH)

    # 1/4-20 Tapped Hole1 (through all)
    with Locations(Plane(origin=(-3.96875, 0, 0), x_dir=(0, 0, -1), z_dir=(1, 0, 0))):
        with Locations((0, 123.048134477)):
            Hole(F_1_4_20_TAPPED_HOLE1_D / 2)

    # CBORE for 1/4 Socket Head Cap Screw3
    with Locations(Plane(origin=(13.49375, 0, 0), x_dir=(0, 0, -1), z_dir=(1, 0, 0))):
        with Locations((0, -46.848134477)):
            CounterBoreHole(CBORE_FOR_1_4_SOCKET_HEAD_CAP_SCREW3_D / 2, CBORE_FOR_1_4_SOCKET_HEAD_CAP_SCREW3_CBORE_D / 2, CBORE_FOR_1_4_SOCKET_HEAD_CAP_SCREW3_CBORE_DEPTH, depth=CBORE_FOR_1_4_SOCKET_HEAD_CAP_SCREW3_DEPTH)

    # 1/4-20 Tapped Hole4 (through all)
    with Locations(Plane(origin=(-3.96875, 0, 0), x_dir=(0, 0, -1), z_dir=(1, 0, 0))):
        with Locations((0, -46.848134477)):
            Hole(F_1_4_20_TAPPED_HOLE4_D / 2)

    # CBORE for 1/4 Socket Head Cap Screw4
    with Locations(Plane(origin=(20.907887704, -10.877662722, 0), x_dir=(0, 0, -1), z_dir=(0.8871201995900625, -0.46153846153845923, 0))):
        with Locations((0, 116.811059209)):
            CounterBoreHole(CBORE_FOR_1_4_SOCKET_HEAD_CAP_SCREW4_D / 2, CBORE_FOR_1_4_SOCKET_HEAD_CAP_SCREW4_CBORE_D / 2, CBORE_FOR_1_4_SOCKET_HEAD_CAP_SCREW4_CBORE_DEPTH, depth=CBORE_FOR_1_4_SOCKET_HEAD_CAP_SCREW4_DEPTH)

    # 1/4-20 Tapped Hole5
    with Locations(Plane(origin=(5.416551219, -2.818047337, 0), x_dir=(0, 0, -1), z_dir=(0.8871201995900618, -0.4615384615384606, 0))):
        with Locations((0, 116.811059209)):
            Hole(F_1_4_20_TAPPED_HOLE5_D / 2, depth=F_1_4_20_TAPPED_HOLE5_DEPTH)

    # CBORE for 1/4 Socket Head Cap Screw5
    with Locations(Plane(origin=(52.107222723, 27.109615385, 0), x_dir=(0, 0, -1), z_dir=(0.8871201995900624, 0.46153846153845934, 0))):
        with Locations((0, -49.2125)):
            CounterBoreHole(CBORE_FOR_1_4_SOCKET_HEAD_CAP_SCREW5_D / 2, CBORE_FOR_1_4_SOCKET_HEAD_CAP_SCREW5_CBORE_D / 2, CBORE_FOR_1_4_SOCKET_HEAD_CAP_SCREW5_CBORE_DEPTH, depth=CBORE_FOR_1_4_SOCKET_HEAD_CAP_SCREW5_DEPTH)

    # 1/4-20 Tapped Hole6
    with Locations(Plane(origin=(36.615886238, 19.05, 0), x_dir=(0, 0, -1), z_dir=(0.8871201995900614, 0.4615384615384613, 0))):
        with Locations((0, -49.2125)):
            Hole(F_1_4_20_TAPPED_HOLE6_D / 2, depth=F_1_4_20_TAPPED_HOLE6_DEPTH)

    # Fillet1
    fillet1_edges = [part.edges().sort_by_distance(p)[0] for p in [
        (-13.49375, 113.523134477, 0),
        (13.49375, 113.523134477, 0),
        (46.483374029, 96.753736767, 0),
        (70.424530416, 84.297967537, 0),
        (70.424530416, -8.097967537, 0),
        (46.483374029, -20.553736767, 0),
        (13.49375, -37.323134477, 0),
        (-13.49375, -37.323134477, 0),
    ]]
    fillet(fillet1_edges, radius=FILLET1_R)


solid = part.part
